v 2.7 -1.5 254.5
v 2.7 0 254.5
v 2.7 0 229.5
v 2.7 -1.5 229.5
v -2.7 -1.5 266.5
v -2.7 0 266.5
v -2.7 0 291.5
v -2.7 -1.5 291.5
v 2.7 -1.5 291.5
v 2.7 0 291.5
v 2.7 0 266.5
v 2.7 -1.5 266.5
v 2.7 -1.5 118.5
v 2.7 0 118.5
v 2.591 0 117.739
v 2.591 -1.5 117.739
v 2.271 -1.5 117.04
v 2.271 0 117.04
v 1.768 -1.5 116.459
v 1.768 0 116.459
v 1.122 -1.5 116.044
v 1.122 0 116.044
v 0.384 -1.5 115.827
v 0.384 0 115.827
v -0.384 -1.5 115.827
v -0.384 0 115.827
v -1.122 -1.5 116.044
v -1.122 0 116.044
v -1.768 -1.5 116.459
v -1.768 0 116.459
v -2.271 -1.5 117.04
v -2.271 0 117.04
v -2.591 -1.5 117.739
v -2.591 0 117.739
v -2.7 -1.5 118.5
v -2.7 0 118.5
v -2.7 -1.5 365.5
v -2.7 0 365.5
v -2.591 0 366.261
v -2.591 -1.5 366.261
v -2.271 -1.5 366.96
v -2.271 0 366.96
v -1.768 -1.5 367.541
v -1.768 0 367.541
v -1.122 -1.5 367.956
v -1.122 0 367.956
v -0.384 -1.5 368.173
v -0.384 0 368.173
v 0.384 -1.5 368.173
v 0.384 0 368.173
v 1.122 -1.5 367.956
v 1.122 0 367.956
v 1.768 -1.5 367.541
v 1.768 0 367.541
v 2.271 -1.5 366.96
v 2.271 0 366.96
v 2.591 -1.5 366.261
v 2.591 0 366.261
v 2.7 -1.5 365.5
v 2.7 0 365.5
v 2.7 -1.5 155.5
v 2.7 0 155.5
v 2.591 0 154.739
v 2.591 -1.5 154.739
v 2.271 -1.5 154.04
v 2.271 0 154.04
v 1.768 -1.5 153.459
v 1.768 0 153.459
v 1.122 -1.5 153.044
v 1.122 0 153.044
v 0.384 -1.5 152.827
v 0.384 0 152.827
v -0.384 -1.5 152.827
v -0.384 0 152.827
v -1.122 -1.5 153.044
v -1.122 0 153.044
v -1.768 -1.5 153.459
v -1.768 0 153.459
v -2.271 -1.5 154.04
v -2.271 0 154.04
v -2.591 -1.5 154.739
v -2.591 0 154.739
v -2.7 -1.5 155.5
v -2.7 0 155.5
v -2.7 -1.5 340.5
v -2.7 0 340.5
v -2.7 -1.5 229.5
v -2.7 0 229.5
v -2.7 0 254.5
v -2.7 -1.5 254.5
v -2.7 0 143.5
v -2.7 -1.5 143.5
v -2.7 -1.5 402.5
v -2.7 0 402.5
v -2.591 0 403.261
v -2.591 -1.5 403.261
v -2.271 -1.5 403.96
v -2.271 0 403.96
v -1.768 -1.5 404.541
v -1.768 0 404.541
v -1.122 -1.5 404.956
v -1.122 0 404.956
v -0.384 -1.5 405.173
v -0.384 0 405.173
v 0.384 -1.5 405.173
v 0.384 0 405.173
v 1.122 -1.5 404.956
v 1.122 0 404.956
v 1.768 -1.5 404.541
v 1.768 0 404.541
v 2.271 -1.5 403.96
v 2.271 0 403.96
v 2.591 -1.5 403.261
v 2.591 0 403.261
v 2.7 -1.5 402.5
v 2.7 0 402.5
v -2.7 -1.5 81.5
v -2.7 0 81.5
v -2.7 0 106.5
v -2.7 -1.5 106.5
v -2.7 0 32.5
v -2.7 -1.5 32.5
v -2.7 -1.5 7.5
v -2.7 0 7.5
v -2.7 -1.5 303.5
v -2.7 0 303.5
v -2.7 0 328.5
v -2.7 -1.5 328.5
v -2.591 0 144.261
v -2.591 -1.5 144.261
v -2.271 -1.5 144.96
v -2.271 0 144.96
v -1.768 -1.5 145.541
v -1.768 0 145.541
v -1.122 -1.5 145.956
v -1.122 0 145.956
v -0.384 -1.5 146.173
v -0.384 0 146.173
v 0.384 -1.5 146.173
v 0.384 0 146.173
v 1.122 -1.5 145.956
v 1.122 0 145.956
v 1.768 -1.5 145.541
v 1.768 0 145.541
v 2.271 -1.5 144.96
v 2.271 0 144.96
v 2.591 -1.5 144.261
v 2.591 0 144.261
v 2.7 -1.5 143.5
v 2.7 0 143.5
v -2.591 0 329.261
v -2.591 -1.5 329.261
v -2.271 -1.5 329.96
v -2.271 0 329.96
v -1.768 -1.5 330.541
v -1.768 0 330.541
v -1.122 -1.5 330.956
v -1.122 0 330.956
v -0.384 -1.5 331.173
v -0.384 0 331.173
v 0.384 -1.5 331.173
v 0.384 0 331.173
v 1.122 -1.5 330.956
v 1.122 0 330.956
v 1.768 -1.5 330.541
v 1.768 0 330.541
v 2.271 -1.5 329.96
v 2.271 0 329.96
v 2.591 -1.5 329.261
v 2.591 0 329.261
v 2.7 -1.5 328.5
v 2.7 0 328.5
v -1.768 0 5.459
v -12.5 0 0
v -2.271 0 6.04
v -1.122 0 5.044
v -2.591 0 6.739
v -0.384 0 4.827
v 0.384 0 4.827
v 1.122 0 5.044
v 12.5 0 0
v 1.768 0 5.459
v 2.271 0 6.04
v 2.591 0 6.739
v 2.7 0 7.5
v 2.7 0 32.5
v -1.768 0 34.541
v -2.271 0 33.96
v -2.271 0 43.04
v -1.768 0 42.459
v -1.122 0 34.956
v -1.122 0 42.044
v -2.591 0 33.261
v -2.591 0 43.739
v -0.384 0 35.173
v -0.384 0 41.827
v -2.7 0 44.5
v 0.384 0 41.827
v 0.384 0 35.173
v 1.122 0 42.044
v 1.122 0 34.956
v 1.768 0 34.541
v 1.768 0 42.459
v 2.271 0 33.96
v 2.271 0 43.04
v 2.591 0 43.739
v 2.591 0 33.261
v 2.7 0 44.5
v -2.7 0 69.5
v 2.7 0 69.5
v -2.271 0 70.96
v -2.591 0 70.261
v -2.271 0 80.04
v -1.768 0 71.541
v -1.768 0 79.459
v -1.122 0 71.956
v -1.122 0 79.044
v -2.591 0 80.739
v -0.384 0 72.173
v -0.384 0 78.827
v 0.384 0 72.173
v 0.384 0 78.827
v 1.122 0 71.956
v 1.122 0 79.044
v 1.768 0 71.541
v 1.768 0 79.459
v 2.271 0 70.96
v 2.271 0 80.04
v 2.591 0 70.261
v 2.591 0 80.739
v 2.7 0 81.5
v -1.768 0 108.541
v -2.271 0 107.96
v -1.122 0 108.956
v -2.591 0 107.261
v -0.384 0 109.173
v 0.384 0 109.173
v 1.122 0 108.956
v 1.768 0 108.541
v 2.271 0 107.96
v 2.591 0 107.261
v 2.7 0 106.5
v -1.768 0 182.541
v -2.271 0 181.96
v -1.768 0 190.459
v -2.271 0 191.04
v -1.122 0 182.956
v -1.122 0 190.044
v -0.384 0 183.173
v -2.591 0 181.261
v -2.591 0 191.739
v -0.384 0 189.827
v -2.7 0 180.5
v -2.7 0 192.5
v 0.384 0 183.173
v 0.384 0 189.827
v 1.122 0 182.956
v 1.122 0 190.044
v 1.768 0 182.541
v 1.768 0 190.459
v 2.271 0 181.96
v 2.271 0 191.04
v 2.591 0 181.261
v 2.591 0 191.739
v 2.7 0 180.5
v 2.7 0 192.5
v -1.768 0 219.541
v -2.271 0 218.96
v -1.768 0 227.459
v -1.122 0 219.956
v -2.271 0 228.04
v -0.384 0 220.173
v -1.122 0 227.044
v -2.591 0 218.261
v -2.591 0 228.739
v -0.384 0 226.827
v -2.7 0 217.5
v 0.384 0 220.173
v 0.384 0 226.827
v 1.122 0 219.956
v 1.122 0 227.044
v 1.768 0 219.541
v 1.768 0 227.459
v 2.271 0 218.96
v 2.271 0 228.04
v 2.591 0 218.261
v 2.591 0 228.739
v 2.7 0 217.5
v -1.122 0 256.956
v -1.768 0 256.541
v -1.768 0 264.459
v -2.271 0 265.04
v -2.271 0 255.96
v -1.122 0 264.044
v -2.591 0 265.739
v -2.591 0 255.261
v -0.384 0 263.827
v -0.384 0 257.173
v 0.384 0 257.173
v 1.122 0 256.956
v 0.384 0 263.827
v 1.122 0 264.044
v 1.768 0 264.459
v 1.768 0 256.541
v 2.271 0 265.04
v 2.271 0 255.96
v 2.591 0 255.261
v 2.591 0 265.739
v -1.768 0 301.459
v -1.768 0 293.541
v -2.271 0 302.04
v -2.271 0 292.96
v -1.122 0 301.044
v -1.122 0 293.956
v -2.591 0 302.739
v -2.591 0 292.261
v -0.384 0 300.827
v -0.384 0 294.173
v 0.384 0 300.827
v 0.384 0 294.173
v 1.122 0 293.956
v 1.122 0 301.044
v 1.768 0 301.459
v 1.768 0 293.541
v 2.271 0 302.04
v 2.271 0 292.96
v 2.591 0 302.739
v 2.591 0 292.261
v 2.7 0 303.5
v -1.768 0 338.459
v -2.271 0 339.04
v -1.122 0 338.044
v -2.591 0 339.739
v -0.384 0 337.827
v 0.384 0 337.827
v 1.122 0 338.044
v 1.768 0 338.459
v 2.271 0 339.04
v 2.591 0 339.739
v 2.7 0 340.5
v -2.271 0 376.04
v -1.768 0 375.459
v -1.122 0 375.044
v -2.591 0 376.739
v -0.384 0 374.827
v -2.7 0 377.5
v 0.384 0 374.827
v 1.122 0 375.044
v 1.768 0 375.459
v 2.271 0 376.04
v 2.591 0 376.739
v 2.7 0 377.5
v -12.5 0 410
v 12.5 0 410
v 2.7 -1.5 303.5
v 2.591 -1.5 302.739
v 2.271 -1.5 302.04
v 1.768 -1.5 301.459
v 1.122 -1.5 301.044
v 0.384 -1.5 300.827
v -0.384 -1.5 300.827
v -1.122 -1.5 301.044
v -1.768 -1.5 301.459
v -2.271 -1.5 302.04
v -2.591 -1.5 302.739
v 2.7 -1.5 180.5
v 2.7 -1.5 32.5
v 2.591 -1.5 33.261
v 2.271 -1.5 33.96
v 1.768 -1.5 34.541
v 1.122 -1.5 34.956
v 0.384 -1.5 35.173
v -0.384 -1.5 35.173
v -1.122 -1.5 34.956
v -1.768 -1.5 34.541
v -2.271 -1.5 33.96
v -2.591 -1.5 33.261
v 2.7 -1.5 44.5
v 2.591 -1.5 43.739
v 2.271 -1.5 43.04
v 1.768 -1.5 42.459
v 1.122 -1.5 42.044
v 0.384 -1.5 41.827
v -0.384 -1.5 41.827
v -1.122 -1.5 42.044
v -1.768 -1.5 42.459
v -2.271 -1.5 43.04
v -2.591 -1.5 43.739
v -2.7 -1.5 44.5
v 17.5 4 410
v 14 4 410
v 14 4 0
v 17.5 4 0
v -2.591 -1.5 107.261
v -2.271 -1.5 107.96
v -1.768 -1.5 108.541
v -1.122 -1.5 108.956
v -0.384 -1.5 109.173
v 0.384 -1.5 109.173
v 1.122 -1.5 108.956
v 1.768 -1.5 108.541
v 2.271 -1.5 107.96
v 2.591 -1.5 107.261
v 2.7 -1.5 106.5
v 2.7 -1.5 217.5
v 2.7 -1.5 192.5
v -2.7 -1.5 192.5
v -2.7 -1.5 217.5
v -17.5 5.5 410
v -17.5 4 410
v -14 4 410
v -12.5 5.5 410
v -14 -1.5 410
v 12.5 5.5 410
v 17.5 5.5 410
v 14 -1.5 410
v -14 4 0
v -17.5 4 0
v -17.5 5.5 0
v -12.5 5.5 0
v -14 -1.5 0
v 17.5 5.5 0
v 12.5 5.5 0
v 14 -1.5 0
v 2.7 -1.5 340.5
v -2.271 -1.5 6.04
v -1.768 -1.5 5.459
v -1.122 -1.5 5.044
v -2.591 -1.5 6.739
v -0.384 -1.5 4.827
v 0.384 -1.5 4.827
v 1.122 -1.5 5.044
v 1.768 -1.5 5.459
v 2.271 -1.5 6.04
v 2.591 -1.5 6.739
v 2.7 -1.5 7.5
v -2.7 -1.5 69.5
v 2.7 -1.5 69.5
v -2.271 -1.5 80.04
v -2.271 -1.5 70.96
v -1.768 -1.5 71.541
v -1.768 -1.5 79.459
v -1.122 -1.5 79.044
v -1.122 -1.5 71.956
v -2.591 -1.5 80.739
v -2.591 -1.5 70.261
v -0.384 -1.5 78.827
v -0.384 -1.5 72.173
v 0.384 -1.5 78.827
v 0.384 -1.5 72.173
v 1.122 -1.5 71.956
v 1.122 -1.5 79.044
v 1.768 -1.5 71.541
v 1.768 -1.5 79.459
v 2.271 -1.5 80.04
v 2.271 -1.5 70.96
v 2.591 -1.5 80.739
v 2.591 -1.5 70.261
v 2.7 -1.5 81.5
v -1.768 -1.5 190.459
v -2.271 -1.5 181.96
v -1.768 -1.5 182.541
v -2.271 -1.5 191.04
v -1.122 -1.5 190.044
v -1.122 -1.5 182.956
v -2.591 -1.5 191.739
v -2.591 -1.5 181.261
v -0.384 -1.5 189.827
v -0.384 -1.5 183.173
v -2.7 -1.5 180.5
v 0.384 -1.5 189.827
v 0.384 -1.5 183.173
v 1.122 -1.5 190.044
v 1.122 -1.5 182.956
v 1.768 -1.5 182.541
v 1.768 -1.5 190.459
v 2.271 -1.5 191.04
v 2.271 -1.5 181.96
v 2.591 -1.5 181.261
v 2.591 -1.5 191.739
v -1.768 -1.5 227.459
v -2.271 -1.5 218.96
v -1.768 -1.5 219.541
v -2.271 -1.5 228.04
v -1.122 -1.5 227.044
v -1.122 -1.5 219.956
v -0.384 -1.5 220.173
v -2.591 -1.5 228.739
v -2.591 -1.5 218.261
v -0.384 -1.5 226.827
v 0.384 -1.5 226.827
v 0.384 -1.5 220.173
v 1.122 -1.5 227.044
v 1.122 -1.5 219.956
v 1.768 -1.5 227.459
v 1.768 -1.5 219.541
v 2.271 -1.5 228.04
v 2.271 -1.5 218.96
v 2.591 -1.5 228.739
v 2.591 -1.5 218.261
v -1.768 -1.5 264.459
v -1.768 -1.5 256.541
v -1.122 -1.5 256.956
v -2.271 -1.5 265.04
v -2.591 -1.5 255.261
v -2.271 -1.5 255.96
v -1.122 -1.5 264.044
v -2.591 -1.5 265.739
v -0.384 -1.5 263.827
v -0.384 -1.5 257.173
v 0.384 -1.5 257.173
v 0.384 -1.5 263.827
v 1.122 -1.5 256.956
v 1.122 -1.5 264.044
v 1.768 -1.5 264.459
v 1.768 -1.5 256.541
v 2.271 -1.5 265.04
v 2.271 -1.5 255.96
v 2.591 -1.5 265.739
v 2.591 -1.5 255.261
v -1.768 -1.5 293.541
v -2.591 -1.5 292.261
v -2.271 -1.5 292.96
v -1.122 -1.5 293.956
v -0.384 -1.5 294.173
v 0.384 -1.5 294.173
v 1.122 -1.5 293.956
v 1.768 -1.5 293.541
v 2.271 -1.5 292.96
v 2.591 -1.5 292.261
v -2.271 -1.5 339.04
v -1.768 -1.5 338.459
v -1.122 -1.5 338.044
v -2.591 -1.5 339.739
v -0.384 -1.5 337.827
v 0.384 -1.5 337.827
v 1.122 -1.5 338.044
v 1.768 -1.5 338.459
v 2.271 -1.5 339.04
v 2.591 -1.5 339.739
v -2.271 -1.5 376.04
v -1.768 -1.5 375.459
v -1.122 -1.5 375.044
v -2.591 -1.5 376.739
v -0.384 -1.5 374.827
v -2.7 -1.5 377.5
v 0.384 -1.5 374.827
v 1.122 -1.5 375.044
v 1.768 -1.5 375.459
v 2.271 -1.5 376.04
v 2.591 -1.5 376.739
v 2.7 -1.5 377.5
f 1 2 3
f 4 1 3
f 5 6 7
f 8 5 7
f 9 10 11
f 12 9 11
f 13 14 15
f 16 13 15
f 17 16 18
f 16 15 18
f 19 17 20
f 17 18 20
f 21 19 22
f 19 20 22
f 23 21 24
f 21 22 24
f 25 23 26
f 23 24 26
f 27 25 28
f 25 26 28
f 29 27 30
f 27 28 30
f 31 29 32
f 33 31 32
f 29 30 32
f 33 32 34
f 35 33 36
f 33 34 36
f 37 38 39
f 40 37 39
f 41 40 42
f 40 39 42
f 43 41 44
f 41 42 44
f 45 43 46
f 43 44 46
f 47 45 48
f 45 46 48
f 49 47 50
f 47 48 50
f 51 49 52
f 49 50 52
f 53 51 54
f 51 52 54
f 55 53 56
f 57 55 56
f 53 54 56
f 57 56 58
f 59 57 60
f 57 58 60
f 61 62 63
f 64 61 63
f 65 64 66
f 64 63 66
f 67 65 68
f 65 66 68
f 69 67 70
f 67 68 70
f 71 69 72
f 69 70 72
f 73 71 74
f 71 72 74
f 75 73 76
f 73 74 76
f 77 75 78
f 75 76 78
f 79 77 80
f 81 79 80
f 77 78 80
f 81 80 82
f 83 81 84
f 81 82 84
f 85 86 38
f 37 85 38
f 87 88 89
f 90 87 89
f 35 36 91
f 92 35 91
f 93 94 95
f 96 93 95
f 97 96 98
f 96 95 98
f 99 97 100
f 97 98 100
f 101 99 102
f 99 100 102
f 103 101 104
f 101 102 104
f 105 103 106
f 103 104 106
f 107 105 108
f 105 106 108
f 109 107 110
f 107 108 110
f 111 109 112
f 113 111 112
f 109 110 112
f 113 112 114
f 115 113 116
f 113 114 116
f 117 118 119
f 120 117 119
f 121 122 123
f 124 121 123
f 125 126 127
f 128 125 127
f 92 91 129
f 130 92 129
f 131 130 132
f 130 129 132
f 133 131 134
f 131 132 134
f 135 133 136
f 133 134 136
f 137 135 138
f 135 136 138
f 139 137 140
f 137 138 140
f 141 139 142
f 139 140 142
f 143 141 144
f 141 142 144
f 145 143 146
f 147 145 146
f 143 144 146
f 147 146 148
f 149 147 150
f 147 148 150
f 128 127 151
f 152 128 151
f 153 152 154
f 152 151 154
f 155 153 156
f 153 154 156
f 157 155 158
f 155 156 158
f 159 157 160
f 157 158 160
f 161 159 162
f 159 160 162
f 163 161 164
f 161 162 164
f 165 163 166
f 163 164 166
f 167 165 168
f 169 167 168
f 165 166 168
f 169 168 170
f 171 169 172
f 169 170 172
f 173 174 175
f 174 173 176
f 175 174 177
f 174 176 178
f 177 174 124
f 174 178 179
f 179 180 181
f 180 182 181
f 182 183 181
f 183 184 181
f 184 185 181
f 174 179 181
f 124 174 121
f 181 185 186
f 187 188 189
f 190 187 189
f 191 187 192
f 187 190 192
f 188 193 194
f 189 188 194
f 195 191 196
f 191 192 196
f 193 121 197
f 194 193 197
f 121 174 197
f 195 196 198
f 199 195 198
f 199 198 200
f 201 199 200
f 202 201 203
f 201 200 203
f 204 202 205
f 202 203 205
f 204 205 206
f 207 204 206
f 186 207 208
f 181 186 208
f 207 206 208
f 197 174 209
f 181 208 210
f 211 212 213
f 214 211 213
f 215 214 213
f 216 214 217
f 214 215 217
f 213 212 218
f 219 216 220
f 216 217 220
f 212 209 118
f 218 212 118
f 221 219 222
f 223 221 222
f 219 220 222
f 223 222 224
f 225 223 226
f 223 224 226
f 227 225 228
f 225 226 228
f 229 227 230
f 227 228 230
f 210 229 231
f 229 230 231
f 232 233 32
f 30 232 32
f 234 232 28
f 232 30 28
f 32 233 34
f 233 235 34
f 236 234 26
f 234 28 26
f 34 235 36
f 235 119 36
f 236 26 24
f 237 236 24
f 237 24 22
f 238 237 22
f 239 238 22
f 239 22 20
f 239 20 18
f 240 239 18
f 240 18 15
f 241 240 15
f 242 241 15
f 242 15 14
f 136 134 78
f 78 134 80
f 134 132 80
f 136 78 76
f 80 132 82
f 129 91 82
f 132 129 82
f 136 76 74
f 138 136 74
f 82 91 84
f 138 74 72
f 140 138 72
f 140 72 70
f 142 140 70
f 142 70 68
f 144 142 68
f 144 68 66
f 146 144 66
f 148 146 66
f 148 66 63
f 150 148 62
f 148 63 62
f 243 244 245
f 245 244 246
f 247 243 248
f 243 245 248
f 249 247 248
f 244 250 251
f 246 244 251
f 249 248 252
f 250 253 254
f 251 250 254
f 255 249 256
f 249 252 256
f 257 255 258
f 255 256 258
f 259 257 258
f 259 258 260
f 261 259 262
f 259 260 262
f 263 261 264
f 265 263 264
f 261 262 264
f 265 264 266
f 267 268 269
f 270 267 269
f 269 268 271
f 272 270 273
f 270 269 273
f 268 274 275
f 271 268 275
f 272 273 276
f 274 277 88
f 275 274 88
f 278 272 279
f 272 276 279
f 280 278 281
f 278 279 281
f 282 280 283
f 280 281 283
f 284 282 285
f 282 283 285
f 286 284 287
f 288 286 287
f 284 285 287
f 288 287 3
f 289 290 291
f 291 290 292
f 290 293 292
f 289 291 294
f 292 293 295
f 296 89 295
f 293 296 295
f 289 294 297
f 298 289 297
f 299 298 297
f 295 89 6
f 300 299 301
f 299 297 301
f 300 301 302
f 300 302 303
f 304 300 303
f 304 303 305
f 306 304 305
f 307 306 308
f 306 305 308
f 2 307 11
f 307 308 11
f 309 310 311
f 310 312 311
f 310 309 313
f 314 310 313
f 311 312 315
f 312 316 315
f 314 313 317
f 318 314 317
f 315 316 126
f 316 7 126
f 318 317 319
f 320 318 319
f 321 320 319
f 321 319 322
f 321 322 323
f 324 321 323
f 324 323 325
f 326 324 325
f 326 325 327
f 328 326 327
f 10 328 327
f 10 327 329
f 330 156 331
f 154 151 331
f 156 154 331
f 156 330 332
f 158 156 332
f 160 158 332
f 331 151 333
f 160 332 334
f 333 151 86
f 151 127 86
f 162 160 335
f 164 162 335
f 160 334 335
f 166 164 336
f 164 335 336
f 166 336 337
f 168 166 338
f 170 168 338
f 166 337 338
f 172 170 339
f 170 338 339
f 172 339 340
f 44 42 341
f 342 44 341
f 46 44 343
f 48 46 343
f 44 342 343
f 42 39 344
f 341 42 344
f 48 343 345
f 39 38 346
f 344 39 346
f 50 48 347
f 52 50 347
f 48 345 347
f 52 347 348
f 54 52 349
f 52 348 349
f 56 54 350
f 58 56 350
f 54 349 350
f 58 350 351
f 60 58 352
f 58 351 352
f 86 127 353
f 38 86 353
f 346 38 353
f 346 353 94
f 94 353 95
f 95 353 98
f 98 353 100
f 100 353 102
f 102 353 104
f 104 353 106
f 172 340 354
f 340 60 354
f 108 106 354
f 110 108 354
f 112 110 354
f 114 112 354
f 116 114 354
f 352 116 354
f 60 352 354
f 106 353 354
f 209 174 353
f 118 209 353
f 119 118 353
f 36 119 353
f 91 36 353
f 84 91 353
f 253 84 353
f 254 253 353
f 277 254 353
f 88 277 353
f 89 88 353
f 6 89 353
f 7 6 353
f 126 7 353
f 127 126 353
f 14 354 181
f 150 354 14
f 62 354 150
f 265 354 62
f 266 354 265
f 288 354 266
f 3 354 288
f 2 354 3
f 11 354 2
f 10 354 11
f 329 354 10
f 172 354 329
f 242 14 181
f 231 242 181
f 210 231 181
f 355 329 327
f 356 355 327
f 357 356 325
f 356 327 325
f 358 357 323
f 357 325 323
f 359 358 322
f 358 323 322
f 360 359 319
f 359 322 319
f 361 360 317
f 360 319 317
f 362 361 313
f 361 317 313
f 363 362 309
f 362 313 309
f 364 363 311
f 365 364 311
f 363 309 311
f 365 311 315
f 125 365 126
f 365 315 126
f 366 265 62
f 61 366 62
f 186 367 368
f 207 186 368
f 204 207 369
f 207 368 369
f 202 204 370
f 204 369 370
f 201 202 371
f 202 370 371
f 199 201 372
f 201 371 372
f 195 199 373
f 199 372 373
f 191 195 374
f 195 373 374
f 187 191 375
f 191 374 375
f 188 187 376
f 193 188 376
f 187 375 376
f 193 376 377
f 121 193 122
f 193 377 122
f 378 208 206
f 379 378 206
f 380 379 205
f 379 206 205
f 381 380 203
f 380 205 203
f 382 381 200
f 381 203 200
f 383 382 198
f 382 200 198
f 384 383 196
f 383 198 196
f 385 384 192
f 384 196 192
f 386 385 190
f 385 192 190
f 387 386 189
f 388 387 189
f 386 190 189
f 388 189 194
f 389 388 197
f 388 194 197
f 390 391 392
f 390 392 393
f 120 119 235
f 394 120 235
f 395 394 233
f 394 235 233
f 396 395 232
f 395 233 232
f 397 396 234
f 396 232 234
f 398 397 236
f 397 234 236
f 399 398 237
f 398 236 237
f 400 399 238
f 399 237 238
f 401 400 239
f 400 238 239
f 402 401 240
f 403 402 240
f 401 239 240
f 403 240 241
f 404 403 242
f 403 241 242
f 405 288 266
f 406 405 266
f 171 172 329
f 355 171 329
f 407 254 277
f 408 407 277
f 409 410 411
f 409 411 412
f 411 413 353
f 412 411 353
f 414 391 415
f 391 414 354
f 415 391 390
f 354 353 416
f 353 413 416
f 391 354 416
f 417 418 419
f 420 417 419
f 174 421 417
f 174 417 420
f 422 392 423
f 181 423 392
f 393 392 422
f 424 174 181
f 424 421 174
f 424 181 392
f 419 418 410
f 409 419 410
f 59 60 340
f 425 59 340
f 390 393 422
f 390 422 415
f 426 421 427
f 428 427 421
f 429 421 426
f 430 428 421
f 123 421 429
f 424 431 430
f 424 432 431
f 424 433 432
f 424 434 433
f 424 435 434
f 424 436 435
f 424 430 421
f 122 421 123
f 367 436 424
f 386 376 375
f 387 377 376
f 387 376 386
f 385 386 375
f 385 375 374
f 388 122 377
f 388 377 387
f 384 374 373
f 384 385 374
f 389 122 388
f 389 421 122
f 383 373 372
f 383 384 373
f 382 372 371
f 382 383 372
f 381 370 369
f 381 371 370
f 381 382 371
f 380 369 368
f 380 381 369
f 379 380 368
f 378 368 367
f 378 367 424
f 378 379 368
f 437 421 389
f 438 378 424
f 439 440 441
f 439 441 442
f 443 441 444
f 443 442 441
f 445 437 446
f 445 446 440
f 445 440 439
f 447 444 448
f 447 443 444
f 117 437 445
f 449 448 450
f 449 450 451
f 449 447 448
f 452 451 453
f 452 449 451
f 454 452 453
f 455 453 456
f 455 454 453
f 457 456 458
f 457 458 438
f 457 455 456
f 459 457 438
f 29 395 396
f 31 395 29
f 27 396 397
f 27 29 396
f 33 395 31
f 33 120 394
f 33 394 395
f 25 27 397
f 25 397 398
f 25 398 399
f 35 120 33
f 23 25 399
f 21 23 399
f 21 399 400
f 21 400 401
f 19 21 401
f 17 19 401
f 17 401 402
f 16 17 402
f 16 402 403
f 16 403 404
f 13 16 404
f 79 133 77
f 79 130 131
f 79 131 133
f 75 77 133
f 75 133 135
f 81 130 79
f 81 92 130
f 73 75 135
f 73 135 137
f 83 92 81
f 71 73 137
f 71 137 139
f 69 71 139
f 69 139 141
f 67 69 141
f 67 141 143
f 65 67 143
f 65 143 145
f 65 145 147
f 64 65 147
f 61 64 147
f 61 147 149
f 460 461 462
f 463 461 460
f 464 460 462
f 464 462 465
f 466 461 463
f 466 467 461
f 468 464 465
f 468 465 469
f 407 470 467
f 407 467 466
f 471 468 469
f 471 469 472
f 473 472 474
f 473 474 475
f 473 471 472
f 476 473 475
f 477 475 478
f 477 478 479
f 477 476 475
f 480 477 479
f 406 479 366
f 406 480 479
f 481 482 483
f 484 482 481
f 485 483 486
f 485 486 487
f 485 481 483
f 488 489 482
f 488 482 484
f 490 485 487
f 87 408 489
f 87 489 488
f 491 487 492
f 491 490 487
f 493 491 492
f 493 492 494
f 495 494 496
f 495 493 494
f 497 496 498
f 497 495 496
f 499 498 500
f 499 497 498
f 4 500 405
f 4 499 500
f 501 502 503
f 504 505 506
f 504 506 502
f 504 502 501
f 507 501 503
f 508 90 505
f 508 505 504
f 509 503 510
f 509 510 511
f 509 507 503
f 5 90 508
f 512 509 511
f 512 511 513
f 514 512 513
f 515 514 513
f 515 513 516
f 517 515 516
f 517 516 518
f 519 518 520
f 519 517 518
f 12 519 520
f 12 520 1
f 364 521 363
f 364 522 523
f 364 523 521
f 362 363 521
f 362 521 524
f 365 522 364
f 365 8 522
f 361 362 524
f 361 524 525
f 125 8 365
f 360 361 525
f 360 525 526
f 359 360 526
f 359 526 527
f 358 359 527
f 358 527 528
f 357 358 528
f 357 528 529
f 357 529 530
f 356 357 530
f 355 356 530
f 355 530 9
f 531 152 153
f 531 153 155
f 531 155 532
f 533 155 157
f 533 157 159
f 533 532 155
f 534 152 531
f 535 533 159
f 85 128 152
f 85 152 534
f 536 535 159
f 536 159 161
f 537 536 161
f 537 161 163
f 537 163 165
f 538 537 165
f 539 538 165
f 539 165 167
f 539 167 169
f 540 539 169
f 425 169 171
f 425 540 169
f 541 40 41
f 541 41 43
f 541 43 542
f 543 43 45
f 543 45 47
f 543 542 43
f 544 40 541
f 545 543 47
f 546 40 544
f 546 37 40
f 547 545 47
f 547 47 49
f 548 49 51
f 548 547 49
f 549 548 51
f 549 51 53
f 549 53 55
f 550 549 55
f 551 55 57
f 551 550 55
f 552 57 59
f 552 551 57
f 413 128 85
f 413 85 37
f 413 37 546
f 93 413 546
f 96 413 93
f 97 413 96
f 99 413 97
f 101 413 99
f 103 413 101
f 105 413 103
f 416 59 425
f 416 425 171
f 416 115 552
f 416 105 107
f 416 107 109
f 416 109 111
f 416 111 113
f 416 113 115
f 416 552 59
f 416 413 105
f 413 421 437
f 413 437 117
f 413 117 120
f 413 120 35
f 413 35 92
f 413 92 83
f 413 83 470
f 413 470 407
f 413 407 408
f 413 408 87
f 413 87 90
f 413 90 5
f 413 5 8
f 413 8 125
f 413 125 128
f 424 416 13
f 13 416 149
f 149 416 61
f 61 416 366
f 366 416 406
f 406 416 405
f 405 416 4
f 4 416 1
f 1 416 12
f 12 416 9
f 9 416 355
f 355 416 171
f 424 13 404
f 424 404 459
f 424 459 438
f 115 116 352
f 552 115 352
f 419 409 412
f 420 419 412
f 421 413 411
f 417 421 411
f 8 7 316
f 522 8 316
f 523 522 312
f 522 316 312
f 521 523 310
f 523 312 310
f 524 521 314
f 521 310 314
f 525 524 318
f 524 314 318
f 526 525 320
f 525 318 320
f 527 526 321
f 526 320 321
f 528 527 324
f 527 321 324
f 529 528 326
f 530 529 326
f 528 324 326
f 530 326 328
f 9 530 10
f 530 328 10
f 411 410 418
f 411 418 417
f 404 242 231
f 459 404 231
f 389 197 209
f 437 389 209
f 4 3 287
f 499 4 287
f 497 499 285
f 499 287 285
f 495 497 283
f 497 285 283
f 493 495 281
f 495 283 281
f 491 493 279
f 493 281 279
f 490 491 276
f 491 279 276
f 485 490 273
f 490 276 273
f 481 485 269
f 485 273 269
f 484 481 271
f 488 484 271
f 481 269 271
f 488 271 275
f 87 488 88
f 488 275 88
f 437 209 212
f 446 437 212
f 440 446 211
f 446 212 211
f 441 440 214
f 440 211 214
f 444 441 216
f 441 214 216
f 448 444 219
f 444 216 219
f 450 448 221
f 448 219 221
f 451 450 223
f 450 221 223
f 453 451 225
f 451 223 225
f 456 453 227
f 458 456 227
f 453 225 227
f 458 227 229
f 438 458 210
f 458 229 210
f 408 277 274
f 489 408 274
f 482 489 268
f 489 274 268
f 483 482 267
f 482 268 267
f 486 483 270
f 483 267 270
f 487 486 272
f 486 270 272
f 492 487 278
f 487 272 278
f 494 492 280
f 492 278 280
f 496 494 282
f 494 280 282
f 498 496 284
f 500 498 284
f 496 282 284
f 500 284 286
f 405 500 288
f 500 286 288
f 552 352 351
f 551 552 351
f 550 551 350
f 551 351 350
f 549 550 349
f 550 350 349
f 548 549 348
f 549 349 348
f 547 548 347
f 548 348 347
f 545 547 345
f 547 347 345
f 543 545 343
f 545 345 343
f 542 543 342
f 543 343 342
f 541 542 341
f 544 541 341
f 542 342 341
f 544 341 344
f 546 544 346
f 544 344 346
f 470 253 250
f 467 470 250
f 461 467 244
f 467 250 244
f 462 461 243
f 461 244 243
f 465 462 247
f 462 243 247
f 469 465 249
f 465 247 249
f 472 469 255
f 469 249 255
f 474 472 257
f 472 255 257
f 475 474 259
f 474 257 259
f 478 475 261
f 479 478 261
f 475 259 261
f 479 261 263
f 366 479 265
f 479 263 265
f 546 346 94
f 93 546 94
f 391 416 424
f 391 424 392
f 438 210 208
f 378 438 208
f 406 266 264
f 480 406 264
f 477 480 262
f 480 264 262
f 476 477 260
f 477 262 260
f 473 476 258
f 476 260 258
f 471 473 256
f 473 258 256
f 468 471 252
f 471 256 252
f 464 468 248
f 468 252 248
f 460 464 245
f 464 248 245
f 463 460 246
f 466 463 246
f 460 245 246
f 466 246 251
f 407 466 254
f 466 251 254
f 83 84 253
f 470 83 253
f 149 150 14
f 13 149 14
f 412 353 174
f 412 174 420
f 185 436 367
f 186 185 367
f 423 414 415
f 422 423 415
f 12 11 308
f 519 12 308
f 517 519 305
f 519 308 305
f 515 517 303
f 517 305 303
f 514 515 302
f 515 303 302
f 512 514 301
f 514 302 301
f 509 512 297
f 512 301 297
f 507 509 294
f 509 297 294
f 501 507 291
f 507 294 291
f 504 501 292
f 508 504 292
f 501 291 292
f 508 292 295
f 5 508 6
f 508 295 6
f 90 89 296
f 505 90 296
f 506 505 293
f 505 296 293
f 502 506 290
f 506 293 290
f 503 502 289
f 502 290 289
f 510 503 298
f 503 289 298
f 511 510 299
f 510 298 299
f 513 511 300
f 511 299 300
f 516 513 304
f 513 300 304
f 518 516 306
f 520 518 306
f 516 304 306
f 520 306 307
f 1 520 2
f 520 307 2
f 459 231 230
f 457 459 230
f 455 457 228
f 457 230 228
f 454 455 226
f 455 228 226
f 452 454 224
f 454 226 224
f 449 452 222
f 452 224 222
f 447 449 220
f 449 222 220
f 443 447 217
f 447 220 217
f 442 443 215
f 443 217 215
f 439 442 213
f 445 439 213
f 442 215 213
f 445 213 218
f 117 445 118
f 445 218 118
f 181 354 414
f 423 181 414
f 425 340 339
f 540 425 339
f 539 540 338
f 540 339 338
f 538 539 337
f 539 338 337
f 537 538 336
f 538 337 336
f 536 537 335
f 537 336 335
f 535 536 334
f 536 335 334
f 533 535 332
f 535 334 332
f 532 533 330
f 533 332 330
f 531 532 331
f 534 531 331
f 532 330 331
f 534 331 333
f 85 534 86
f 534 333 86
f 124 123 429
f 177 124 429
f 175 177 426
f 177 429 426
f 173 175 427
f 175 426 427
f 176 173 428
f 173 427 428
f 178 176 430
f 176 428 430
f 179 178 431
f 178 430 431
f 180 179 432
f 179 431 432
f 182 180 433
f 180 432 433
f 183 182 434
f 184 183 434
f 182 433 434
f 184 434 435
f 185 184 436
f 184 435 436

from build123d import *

# Parameters (mm, degrees)
CROQUIS1_W              = 35
CROQUIS1_H              = 410
SALIENTE_EXTRUIR1_DEPTH = 7
CROQUIS2_W              = 25
CROQUIS2_H              = 5.5
CORTAR_EXTRUIR1_DEPTH   = 411
CROQUIS3_W              = 3.5
CROQUIS3_H              = 5.5
CORTAR_EXTRUIR2_DEPTH   = 411
CROQUIS4_W              = 3.5
CROQUIS4_H              = 5.5
CORTAR_EXTRUIR3_DEPTH   = 411
CORTAR_EXTRUIR4_DEPTH   = 2.5
CORTAR_EXTRUIR5_DEPTH   = 2.5
CORTAR_EXTRUIR6_DEPTH   = 2.5
CORTAR_EXTRUIR7_DEPTH   = 2.5
CORTAR_EXTRUIR8_DEPTH   = 2.5
CORTAR_EXTRUIR9_DEPTH   = 2.5
CORTAR_EXTRUIR10_DEPTH  = 2.5
CORTAR_EXTRUIR11_DEPTH  = 2.5
CORTAR_EXTRUIR12_DEPTH  = 2.5
CORTAR_EXTRUIR13_DEPTH  = 2.5
CORTAR_EXTRUIR14_DEPTH  = 8


with BuildPart() as part:
    # Croquis1 → Saliente-Extruir1 (new body)
    with BuildSketch(Plane.XZ.offset(1.5)):
        with Locations((0, 205)):
            Rectangle(CROQUIS1_W, CROQUIS1_H)
    extrude(amount=-SALIENTE_EXTRUIR1_DEPTH)

    # Croquis2 → Cortar-Extruir1 (cut, through all)
    with BuildSketch(Plane.XY.offset(410)):
        with Locations((0, 2.75)):
            Rectangle(CROQUIS2_W, CROQUIS2_H)
    extrude(amount=-CORTAR_EXTRUIR1_DEPTH, mode=Mode.SUBTRACT)

    # Croquis3 → Cortar-Extruir2 (cut, through all)
    with BuildSketch(Plane.XY.offset(410)):
        with Locations((15.75, 1.25)):
            Rectangle(CROQUIS3_W, CROQUIS3_H)
    extrude(amount=-CORTAR_EXTRUIR2_DEPTH, mode=Mode.SUBTRACT)

    # Croquis4 → Cortar-Extruir3 (cut, through all)
    with BuildSketch(Plane.XY.offset(410)):
        with Locations((-15.75, 1.25)):
            Rectangle(CROQUIS4_W, CROQUIS4_H)
    extrude(amount=-CORTAR_EXTRUIR3_DEPTH, mode=Mode.SUBTRACT)

    # Croquis5 → Cortar-Extruir4 (cut, through all)
    with BuildSketch(Plane(origin=(0, 0, 0), x_dir=(-1, 0, 0), z_dir=(0, 1, 0))):
        with BuildLine():
            Line((-2.7, 402.5), (-2.7, 377.5))
            ThreePointArc((-2.7, 377.5), (0, 374.8), (2.7, 377.5))
            Line((2.7, 377.5), (2.7, 402.5))
            ThreePointArc((2.7, 402.5), (0, 405.2), (-2.7, 402.5))
        make_face()
    extrude(amount=-CORTAR_EXTRUIR4_DEPTH, mode=Mode.SUBTRACT)

    # Croquis6 → Cortar-Extruir5 (cut, through all)
    with BuildSketch(Plane(origin=(0, 0, 0), x_dir=(-1, 0, 0), z_dir=(0, 1, 0))):
        with BuildLine():
            Line((-2.7, 365.5), (-2.7, 340.5))
            ThreePointArc((-2.7, 340.5), (0, 337.8), (2.7, 340.5))
            Line((2.7, 340.5), (2.7, 365.5))
            ThreePointArc((2.7, 365.5), (0, 368.2), (-2.7, 365.5))
        make_face()
    extrude(amount=-CORTAR_EXTRUIR5_DEPTH, mode=Mode.SUBTRACT)

    # Croquis7 → Cortar-Extruir6 (cut, through all)
    with BuildSketch(Plane(origin=(0, 0, 0), x_dir=(-1, 0, 0), z_dir=(0, 1, 0))):
        with BuildLine():
            Line((-2.7, 328.5), (-2.7, 303.5))
            ThreePointArc((-2.7, 303.5), (0, 300.8), (2.7, 303.5))
            Line((2.7, 303.5), (2.7, 328.5))
            ThreePointArc((2.7, 328.5), (0, 331.2), (-2.7, 328.5))
        make_face()
    extrude(amount=-CORTAR_EXTRUIR6_DEPTH, mode=Mode.SUBTRACT)

    # Croquis8 → Cortar-Extruir7 (cut, through all)
    with BuildSketch(Plane(origin=(0, 0, 0), x_dir=(-1, 0, 0), z_dir=(0, 1, 0))):
        with BuildLine():
            Line((-2.7, 291.5), (-2.7, 266.5))
            ThreePointArc((-2.7, 266.5), (0, 263.8), (2.7, 266.5))
            Line((2.7, 266.5), (2.7, 291.5))
            ThreePointArc((2.7, 291.5), (0, 294.2), (-2.7, 291.5))
        make_face()
    extrude(amount=-CORTAR_EXTRUIR7_DEPTH, mode=Mode.SUBTRACT)

    # Croquis9 → Cortar-Extruir8 (cut, through all)
    with BuildSketch(Plane(origin=(0, 0, 0), x_dir=(-1, 0, 0), z_dir=(0, 1, 0))):
        with BuildLine():
            Line((-2.7, 254.5), (-2.7, 229.5))
            ThreePointArc((-2.7, 229.5), (0, 226.8), (2.7, 229.5))
            Line((2.7, 229.5), (2.7, 254.5))
            ThreePointArc((2.7, 254.5), (0, 257.2), (-2.7, 254.5))
        make_face()
    extrude(amount=-CORTAR_EXTRUIR8_DEPTH, mode=Mode.SUBTRACT)

    # Croquis10 → Cortar-Extruir9 (cut, through all)
    with BuildSketch(Plane(origin=(0, 0, 0), x_dir=(-1, 0, 0), z_dir=(0, 1, 0))):
        with BuildLine():
            Line((-2.7, 217.5), (-2.7, 192.5))
            ThreePointArc((-2.7, 192.5), (0, 189.8), (2.7, 192.5))
            Line((2.7, 192.5), (2.7, 217.5))
            ThreePointArc((2.7, 217.5), (0, 220.2), (-2.7, 217.5))
        make_face()
    extrude(amount=-CORTAR_EXTRUIR9_DEPTH, mode=Mode.SUBTRACT)

    # Croquis11 → Cortar-Extruir10 (cut, through all)
    with BuildSketch(Plane(origin=(0, 0, 0), x_dir=(-1, 0, 0), z_dir=(0, 1, 0))):
        with BuildLine():
            Line((-2.7, 180.5), (-2.7, 155.5))
            ThreePointArc((-2.7, 155.5), (0, 152.8), (2.7, 155.5))
            Line((2.7, 155.5), (2.7, 180.5))
            ThreePointArc((2.7, 180.5), (0, 183.2), (-2.7, 180.5))
        make_face()
    extrude(amount=-CORTAR_EXTRUIR10_DEPTH, mode=Mode.SUBTRACT)

    # Croquis12 → Cortar-Extruir11 (cut, through all)
    with BuildSketch(Plane(origin=(0, 0, 0), x_dir=(-1, 0, 0), z_dir=(0, 1, 0))):
        with BuildLine():
            Line((-2.7, 143.5), (-2.7, 118.5))
            ThreePointArc((-2.7, 118.5), (0, 115.8), (2.7, 118.5))
            Line((2.7, 118.5), (2.7, 143.5))
            ThreePointArc((2.7, 143.5), (0, 146.2), (-2.7, 143.5))
        make_face()
    extrude(amount=-CORTAR_EXTRUIR11_DEPTH, mode=Mode.SUBTRACT)

    # Croquis13 → Cortar-Extruir12 (cut, through all)
    with BuildSketch(Plane(origin=(0, 0, 0), x_dir=(-1, 0, 0), z_dir=(0, 1, 0))):
        with BuildLine():
            Line((-2.7, 106.5), (-2.7, 81.5))
            ThreePointArc((-2.7, 81.5), (0, 78.8), (2.7, 81.5))
            Line((2.7, 81.5), (2.7, 106.5))
            ThreePointArc((2.7, 106.5), (0, 109.2), (-2.7, 106.5))
        make_face()
    extrude(amount=-CORTAR_EXTRUIR12_DEPTH, mode=Mode.SUBTRACT)

    # Croquis14 → Cortar-Extruir13 (cut, through all)
    with BuildSketch(Plane(origin=(0, 0, 0), x_dir=(-1, 0, 0), z_dir=(0, 1, 0))):
        with BuildLine():
            Line((-2.7, 69.5), (-2.7, 44.5))
            ThreePointArc((-2.7, 44.5), (0, 41.8), (2.7, 44.5))
            Line((2.7, 44.5), (2.7, 69.5))
            ThreePointArc((2.7, 69.5), (0, 72.2), (-2.7, 69.5))
        make_face()
    extrude(amount=-CORTAR_EXTRUIR13_DEPTH, mode=Mode.SUBTRACT)

    # Croquis15 → Cortar-Extruir14 (cut, through all)
    with BuildSketch(Plane.XZ.offset(1.5)):
        with BuildLine():
            Line((-2.7, 32.5), (-2.7, 7.5))
            ThreePointArc((-2.7, 7.5), (0, 4.8), (2.7, 7.5))
            Line((2.7, 7.5), (2.7, 32.5))
            ThreePointArc((2.7, 32.5), (0, 35.2), (-2.7, 32.5))
        make_face()
    extrude(amount=-CORTAR_EXTRUIR14_DEPTH, mode=Mode.SUBTRACT)


solid = part.part
